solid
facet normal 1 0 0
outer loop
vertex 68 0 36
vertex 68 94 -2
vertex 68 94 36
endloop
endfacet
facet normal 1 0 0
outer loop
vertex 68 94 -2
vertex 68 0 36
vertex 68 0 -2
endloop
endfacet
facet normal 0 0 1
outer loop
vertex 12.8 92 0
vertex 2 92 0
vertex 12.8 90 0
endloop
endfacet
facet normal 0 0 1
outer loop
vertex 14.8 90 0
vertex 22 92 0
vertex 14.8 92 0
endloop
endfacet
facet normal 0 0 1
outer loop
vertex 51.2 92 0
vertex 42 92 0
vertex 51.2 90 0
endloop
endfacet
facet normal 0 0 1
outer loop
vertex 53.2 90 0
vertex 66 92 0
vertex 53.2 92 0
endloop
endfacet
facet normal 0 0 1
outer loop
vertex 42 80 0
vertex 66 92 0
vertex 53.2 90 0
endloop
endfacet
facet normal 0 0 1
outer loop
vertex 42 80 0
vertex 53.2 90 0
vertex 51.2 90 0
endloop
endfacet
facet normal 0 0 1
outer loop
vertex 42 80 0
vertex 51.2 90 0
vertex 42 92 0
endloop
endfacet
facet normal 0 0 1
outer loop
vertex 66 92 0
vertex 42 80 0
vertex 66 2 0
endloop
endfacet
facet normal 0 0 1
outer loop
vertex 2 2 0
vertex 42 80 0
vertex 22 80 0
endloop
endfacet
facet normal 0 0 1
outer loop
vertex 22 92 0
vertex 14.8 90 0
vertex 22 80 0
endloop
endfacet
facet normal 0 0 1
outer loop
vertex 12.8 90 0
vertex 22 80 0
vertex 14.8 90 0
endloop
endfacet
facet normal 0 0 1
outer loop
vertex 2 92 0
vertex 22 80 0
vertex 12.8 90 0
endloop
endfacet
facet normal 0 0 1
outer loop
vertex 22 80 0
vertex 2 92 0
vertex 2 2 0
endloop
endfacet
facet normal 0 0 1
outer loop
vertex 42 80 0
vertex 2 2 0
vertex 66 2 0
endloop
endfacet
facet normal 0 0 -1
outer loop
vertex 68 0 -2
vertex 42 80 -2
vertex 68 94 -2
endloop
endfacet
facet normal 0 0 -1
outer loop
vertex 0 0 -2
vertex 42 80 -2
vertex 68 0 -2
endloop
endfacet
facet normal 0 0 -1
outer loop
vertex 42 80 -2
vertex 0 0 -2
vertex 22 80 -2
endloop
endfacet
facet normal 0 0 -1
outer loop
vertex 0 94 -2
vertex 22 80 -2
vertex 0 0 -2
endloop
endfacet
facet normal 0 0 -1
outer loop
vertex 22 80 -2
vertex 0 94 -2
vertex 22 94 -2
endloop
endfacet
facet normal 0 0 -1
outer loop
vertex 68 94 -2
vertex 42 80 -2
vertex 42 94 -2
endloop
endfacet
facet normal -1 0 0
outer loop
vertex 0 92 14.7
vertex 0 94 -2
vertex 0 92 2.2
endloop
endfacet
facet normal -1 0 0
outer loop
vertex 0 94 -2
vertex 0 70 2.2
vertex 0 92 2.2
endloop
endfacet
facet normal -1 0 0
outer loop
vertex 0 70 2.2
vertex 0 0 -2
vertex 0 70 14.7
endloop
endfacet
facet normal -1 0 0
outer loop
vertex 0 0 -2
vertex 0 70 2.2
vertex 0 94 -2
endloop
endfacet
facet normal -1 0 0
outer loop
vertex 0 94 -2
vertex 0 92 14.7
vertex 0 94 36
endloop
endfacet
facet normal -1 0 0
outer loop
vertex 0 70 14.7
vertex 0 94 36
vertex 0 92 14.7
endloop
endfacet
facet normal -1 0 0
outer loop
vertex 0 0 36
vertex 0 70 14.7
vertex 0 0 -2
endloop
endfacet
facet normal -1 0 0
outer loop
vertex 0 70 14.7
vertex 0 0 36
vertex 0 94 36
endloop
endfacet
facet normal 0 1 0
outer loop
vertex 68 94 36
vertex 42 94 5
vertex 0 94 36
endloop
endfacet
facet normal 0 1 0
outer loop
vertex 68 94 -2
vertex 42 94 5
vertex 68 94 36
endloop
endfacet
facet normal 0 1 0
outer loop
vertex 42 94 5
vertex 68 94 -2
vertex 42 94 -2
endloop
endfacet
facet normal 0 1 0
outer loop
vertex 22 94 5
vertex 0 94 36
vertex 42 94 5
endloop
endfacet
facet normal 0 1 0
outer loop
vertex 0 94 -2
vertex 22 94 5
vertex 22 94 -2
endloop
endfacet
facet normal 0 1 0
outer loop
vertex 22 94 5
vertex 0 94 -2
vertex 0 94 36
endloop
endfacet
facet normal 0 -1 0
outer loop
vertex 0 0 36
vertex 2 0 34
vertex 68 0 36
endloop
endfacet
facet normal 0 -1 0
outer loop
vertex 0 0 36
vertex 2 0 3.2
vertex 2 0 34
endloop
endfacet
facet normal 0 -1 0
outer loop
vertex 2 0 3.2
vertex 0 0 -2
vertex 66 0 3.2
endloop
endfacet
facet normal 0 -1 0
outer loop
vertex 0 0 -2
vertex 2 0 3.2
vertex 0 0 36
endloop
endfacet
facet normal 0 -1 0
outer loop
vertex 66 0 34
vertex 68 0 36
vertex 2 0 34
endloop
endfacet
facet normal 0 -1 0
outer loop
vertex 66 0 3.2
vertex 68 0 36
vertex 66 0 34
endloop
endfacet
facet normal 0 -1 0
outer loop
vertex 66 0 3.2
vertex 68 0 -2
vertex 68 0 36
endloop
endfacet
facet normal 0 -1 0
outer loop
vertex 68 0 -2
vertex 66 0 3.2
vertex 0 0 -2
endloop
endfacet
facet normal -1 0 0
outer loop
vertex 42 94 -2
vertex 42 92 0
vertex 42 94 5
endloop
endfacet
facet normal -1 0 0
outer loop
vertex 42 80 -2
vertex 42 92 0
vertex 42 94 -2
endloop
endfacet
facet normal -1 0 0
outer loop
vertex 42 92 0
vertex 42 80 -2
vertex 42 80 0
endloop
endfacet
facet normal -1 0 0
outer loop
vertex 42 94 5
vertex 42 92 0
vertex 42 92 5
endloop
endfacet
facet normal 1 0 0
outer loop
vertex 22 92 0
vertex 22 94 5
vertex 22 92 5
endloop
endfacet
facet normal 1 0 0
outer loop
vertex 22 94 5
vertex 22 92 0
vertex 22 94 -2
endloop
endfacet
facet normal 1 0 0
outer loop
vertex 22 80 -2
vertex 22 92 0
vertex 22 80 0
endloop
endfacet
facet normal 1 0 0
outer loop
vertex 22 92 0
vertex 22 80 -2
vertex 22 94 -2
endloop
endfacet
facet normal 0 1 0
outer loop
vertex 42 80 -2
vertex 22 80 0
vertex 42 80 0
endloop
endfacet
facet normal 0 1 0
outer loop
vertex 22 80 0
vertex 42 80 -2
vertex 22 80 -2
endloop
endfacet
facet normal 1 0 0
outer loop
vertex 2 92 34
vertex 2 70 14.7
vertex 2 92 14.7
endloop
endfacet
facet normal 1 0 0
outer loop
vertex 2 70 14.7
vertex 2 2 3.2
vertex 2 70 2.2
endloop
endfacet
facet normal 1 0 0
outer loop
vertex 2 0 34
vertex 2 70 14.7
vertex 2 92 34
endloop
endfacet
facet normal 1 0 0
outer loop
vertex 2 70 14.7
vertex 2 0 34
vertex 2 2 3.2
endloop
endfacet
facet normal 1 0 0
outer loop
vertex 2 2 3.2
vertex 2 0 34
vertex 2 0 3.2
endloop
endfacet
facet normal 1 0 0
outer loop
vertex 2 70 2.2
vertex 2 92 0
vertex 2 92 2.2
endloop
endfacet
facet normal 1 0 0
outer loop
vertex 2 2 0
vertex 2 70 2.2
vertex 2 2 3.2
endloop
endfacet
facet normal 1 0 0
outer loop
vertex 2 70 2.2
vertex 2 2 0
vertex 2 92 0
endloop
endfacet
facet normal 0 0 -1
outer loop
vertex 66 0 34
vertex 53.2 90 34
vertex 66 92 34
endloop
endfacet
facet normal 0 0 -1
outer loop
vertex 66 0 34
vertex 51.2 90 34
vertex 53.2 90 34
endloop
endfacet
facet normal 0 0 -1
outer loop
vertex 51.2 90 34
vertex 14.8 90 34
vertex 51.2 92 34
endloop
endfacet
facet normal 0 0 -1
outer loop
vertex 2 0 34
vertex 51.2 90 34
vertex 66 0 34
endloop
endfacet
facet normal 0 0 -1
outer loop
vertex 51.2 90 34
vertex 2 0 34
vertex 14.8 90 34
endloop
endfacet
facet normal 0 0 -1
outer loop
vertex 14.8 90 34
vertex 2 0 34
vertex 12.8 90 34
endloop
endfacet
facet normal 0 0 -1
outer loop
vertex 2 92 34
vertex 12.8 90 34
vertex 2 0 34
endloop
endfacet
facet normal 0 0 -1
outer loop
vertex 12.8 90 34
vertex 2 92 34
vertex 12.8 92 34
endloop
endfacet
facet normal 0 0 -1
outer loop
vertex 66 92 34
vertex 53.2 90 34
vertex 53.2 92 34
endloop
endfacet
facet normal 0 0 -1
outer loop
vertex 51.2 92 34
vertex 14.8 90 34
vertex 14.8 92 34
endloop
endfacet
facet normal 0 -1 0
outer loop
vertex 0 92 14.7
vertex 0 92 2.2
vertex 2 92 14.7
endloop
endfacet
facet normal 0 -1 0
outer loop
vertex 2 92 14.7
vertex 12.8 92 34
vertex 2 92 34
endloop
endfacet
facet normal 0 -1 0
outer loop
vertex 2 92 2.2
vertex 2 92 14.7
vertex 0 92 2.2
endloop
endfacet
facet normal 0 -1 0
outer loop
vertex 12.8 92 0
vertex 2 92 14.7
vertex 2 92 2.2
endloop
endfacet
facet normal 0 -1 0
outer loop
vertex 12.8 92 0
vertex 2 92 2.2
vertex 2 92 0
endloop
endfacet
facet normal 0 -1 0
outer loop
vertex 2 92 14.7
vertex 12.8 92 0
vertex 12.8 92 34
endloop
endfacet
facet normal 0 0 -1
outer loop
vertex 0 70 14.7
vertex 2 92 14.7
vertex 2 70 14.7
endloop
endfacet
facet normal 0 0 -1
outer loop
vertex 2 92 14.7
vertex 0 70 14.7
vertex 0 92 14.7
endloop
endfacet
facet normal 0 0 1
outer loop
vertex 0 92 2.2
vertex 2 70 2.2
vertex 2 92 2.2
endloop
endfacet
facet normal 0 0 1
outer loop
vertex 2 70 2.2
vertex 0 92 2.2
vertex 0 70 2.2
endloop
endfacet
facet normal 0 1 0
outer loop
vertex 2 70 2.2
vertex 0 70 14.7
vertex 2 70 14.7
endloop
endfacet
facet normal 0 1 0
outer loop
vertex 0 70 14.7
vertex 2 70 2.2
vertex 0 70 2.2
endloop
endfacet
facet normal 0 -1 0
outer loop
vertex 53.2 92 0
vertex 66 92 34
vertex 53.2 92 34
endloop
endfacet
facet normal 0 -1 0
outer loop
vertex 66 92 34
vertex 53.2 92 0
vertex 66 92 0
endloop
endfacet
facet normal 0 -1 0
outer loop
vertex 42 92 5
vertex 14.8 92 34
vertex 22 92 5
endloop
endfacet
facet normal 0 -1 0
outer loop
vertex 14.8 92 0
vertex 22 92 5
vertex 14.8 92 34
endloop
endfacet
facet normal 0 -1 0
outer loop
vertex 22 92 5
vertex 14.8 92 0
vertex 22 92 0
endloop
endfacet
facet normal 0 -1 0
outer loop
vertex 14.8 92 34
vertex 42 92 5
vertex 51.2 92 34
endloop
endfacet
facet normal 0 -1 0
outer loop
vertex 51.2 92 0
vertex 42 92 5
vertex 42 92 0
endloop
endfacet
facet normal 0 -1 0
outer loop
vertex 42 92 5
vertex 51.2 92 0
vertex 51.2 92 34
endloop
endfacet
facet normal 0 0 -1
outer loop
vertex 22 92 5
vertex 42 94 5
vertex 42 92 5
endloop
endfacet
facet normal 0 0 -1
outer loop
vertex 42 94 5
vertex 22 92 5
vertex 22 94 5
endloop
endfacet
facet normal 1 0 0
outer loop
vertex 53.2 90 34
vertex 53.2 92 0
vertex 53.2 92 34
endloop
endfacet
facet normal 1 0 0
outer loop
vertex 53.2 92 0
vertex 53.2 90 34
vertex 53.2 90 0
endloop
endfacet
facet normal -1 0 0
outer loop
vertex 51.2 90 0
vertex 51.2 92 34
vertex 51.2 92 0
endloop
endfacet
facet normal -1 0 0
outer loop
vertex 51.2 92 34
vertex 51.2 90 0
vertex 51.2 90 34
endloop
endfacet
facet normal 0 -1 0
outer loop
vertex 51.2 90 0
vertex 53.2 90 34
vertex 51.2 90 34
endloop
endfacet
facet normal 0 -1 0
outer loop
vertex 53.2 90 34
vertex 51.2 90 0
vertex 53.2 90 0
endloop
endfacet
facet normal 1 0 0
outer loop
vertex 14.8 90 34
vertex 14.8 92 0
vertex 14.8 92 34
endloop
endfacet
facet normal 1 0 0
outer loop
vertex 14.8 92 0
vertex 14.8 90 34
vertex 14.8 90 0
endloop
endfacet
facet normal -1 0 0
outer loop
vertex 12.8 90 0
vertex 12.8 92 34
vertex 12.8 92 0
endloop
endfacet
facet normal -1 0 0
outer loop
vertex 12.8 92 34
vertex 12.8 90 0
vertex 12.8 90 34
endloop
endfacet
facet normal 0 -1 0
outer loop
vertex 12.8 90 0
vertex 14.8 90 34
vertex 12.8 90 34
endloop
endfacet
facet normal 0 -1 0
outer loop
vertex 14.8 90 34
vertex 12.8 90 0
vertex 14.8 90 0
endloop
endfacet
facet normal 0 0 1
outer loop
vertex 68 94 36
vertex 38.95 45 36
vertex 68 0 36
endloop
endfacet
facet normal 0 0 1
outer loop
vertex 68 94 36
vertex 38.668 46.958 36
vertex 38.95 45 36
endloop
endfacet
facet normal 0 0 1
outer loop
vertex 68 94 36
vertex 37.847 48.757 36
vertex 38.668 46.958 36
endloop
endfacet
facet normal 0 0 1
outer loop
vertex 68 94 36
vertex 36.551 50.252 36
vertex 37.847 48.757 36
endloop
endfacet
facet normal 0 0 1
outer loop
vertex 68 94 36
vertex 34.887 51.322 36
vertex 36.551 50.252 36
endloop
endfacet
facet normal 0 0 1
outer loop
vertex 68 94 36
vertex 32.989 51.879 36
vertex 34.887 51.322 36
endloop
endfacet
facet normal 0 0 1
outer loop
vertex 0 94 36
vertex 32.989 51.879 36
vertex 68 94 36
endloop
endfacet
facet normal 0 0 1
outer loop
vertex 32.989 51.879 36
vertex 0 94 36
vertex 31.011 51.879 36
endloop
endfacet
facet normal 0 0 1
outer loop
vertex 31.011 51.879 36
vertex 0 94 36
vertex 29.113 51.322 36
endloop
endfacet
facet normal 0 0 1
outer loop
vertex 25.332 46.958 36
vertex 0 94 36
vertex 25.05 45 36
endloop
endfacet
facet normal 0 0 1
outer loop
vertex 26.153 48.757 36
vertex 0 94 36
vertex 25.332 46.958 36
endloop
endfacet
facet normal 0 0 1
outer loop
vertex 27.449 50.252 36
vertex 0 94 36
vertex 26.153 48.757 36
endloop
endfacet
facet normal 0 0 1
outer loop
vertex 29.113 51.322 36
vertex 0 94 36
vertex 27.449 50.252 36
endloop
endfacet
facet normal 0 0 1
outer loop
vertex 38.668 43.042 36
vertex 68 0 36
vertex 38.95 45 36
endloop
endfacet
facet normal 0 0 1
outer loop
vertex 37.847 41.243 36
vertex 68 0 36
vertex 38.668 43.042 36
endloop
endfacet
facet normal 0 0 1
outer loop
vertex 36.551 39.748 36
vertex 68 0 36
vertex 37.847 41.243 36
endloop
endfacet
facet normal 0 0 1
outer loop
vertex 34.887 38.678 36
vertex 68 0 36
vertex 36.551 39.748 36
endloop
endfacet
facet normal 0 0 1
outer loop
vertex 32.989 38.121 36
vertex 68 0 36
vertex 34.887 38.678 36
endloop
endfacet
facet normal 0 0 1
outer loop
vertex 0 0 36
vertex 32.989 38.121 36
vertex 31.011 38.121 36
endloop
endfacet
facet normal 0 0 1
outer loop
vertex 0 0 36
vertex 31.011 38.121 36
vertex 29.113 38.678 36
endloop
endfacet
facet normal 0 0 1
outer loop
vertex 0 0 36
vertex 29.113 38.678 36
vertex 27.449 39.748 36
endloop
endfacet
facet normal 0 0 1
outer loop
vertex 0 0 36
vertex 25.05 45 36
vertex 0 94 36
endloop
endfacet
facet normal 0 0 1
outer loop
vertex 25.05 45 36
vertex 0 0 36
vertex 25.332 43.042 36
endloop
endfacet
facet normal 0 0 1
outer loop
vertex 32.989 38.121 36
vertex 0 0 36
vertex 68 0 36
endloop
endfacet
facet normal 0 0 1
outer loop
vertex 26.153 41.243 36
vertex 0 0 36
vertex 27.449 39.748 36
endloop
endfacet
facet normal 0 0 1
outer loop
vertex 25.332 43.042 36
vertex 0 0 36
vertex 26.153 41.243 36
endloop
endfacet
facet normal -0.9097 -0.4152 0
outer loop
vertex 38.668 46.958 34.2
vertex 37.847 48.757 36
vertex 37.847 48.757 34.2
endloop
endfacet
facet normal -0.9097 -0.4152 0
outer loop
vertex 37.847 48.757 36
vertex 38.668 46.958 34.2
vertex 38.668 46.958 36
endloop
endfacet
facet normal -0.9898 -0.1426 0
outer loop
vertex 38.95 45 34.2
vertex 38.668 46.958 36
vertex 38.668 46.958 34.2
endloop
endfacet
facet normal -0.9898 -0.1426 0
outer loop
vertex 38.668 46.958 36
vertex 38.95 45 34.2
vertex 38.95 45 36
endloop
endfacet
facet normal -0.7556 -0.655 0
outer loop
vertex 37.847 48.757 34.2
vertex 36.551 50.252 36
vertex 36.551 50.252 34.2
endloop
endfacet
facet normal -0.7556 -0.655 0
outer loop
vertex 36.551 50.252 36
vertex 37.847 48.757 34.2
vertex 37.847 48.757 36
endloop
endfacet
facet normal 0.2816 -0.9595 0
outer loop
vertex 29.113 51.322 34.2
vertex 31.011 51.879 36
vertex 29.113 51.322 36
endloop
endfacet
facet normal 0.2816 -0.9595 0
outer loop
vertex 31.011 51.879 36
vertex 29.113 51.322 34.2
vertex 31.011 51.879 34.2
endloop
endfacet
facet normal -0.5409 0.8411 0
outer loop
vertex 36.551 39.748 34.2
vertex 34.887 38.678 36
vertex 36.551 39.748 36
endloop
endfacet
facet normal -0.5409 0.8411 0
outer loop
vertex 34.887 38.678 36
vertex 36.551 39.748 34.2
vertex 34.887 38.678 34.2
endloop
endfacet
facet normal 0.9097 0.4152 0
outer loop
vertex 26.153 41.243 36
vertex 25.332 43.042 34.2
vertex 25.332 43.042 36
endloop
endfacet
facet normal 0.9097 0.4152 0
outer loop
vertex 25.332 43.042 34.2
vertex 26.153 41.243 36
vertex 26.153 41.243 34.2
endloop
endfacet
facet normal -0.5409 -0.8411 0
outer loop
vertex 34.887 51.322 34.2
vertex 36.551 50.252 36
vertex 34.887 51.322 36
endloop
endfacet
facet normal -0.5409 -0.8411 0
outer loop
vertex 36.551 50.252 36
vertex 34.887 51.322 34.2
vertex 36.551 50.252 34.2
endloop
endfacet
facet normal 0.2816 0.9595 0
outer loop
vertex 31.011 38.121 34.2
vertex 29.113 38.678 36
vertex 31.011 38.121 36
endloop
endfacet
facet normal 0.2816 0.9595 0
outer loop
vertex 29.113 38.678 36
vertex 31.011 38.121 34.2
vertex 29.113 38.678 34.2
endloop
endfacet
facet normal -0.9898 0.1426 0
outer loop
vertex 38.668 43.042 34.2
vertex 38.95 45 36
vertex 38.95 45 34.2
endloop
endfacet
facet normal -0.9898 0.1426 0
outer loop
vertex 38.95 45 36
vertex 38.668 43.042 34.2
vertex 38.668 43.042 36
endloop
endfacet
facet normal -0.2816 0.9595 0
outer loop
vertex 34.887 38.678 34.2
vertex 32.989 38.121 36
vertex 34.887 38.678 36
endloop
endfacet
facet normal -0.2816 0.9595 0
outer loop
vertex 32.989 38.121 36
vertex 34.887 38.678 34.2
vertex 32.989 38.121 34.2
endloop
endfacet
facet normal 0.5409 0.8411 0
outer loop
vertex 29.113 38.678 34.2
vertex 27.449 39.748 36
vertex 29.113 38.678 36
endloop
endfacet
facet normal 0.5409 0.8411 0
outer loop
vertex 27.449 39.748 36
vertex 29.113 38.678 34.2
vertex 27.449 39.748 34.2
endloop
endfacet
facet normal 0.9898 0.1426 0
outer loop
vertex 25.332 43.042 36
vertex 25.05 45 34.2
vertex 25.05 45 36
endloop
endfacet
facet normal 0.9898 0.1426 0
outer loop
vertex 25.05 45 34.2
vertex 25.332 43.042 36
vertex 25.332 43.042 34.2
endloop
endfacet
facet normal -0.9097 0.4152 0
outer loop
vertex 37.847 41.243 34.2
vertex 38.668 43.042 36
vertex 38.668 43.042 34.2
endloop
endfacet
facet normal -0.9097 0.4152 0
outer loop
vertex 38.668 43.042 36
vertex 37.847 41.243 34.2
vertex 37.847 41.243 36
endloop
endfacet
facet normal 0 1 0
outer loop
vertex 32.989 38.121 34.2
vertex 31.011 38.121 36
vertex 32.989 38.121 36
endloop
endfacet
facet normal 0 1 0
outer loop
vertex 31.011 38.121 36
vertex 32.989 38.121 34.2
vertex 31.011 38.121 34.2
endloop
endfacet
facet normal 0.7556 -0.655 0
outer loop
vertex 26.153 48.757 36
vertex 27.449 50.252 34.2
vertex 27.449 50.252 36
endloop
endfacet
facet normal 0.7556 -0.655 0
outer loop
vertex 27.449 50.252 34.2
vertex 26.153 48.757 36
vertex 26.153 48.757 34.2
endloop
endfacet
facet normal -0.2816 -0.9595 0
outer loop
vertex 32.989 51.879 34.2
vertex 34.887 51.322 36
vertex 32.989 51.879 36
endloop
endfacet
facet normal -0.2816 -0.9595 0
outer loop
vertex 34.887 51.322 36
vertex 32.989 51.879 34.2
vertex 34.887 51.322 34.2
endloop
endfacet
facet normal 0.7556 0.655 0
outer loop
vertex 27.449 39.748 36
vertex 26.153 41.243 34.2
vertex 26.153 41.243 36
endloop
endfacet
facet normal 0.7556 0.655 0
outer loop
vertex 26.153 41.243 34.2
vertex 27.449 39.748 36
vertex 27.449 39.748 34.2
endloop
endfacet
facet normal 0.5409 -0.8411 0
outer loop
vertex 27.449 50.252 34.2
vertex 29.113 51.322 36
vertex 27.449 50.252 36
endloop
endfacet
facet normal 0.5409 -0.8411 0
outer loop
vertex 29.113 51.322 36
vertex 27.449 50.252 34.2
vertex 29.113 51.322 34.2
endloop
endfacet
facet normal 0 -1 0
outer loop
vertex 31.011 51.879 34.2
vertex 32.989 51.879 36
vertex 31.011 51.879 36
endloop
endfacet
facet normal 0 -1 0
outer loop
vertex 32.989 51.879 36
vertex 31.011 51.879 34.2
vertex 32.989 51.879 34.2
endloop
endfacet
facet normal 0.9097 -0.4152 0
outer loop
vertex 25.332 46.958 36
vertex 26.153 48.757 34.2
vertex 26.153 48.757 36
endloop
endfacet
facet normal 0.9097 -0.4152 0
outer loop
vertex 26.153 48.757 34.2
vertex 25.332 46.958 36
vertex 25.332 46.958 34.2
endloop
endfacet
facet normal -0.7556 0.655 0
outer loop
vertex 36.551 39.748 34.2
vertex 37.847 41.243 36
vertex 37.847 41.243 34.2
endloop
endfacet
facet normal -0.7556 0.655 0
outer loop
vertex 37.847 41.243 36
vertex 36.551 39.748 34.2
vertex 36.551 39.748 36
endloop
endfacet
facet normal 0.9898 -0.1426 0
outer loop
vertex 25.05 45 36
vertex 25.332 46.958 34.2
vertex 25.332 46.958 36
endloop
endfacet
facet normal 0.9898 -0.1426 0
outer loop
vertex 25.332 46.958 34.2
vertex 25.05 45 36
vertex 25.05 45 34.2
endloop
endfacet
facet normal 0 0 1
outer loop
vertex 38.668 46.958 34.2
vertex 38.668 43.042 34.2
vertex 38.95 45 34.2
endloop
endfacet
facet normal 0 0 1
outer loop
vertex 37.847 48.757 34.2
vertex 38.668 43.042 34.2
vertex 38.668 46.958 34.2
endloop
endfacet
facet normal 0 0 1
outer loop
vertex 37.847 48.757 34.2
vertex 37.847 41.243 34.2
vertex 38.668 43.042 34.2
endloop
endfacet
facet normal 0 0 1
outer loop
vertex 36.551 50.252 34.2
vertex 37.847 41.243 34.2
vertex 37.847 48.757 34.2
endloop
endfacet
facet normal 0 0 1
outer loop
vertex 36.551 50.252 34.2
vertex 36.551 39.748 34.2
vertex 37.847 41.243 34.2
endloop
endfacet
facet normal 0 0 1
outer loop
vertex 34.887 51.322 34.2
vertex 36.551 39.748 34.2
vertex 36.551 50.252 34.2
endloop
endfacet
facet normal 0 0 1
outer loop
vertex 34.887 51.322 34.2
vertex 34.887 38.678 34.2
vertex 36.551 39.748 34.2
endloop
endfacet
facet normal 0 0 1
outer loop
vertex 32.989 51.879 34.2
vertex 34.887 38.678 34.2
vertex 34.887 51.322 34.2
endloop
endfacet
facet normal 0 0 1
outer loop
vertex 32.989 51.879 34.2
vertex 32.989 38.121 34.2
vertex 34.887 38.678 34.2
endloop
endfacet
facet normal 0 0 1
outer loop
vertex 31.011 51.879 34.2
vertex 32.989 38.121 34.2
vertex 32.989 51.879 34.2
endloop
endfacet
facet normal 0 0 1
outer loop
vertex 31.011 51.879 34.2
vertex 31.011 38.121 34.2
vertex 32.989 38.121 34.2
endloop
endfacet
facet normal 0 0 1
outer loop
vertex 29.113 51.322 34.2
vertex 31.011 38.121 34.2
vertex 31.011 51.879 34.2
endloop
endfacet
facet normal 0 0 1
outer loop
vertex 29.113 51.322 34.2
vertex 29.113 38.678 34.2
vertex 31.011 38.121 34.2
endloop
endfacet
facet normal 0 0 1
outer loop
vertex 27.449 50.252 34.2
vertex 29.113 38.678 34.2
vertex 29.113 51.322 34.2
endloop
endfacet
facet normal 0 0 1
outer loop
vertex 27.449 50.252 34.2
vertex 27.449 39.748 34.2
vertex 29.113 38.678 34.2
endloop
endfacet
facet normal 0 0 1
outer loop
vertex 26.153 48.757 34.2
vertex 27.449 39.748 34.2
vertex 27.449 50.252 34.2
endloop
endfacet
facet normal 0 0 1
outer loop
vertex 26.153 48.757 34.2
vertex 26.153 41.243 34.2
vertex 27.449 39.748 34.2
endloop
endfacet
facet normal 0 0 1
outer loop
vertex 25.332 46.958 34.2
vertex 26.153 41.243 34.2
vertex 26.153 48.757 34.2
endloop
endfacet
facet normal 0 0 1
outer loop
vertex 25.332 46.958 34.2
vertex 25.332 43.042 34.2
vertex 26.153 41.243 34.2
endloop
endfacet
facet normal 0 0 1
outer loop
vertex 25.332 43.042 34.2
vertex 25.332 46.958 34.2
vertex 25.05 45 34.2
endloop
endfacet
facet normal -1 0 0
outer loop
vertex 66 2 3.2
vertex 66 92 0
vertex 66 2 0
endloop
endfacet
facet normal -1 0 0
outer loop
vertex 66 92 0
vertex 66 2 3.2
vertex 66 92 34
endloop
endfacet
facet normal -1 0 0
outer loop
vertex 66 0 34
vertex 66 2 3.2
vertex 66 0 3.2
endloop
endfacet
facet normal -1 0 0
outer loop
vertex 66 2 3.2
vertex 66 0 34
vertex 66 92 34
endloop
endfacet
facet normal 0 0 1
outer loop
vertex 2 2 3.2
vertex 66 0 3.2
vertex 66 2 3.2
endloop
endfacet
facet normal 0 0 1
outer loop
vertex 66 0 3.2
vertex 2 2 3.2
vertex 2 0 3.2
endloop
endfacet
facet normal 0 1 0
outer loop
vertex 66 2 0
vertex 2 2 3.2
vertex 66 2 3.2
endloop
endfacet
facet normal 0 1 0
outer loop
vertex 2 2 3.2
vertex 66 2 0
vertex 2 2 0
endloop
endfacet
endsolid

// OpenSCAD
piWidth = 64; //56
piDepth = 90; //85
piHeight = 17;
piThickBoard = 1.2;
piPinOverhang = 2;
piHoleDia = 2.2;
piHoleCenterX = 1;
piHoleCenterY = 1;
piUsbWidth = 20; //10
piUsbHeigth = 10; //4
piUsbY = 10;
piUsbZ = -1; //1
sdSlotX = 20;
sdSlotY = 20;
sdSlotZ = 5;
sdOverhang = 4;
buttonDia = 13.9; //13.4
buttonDepth = 17;
buttonCount = 1;
shell = 2;

boxHeight = piHeight + buttonDepth;
piThick = piThickBoard + piPinOverhang;

//bottom
translate([0,0,-shell])
    difference(){
        cube([piWidth+shell+shell,piDepth+shell+shell,shell]);
        translate([piWidth/2-sdSlotX/2,piDepth-sdSlotY/2,-1])
            cube([sdSlotX,sdSlotY,shell+2]);
    }
//front
translate([0,0,0])
    cube([piWidth+shell,shell,piThick]);
//left
translate([0,0,0])
    difference() {
        cube([shell,piDepth+shell,boxHeight]);
        translate([0-1,piDepth-piUsbY-piUsbWidth/2,piUsbZ+piThick])
            cube([shell+2,piUsbWidth+piUsbWidth/4,piUsbHeigth+piUsbHeigth/4]);
    }
//right
translate([piWidth+shell,0,0])
    cube([shell,piDepth+shell,boxHeight]);
//back
translate([0,piDepth+shell,0]){
  translate([piWidth/10*8, -2, 0]){
    cube([2,sdOverhang,boxHeight]);
  }
  translate([piWidth/10*2, -2, 0]) {
    cube([2,sdOverhang,boxHeight]);
  }
  difference() {
      cube([piWidth+shell+shell,shell,boxHeight]);
      translate([piWidth/2-sdSlotX/2,-sdSlotY/2,0])
          cube([sdSlotX,sdSlotY,sdSlotZ]);
  }
}
//top
translate([0,0,boxHeight])
    difference() {
        cube([piWidth+shell+shell,piDepth+shell+shell,shell]);
        translate([piWidth/2,piDepth/(1+buttonCount),0.2])
            cylinder(d=buttonDia,h=shell+2);
    }
